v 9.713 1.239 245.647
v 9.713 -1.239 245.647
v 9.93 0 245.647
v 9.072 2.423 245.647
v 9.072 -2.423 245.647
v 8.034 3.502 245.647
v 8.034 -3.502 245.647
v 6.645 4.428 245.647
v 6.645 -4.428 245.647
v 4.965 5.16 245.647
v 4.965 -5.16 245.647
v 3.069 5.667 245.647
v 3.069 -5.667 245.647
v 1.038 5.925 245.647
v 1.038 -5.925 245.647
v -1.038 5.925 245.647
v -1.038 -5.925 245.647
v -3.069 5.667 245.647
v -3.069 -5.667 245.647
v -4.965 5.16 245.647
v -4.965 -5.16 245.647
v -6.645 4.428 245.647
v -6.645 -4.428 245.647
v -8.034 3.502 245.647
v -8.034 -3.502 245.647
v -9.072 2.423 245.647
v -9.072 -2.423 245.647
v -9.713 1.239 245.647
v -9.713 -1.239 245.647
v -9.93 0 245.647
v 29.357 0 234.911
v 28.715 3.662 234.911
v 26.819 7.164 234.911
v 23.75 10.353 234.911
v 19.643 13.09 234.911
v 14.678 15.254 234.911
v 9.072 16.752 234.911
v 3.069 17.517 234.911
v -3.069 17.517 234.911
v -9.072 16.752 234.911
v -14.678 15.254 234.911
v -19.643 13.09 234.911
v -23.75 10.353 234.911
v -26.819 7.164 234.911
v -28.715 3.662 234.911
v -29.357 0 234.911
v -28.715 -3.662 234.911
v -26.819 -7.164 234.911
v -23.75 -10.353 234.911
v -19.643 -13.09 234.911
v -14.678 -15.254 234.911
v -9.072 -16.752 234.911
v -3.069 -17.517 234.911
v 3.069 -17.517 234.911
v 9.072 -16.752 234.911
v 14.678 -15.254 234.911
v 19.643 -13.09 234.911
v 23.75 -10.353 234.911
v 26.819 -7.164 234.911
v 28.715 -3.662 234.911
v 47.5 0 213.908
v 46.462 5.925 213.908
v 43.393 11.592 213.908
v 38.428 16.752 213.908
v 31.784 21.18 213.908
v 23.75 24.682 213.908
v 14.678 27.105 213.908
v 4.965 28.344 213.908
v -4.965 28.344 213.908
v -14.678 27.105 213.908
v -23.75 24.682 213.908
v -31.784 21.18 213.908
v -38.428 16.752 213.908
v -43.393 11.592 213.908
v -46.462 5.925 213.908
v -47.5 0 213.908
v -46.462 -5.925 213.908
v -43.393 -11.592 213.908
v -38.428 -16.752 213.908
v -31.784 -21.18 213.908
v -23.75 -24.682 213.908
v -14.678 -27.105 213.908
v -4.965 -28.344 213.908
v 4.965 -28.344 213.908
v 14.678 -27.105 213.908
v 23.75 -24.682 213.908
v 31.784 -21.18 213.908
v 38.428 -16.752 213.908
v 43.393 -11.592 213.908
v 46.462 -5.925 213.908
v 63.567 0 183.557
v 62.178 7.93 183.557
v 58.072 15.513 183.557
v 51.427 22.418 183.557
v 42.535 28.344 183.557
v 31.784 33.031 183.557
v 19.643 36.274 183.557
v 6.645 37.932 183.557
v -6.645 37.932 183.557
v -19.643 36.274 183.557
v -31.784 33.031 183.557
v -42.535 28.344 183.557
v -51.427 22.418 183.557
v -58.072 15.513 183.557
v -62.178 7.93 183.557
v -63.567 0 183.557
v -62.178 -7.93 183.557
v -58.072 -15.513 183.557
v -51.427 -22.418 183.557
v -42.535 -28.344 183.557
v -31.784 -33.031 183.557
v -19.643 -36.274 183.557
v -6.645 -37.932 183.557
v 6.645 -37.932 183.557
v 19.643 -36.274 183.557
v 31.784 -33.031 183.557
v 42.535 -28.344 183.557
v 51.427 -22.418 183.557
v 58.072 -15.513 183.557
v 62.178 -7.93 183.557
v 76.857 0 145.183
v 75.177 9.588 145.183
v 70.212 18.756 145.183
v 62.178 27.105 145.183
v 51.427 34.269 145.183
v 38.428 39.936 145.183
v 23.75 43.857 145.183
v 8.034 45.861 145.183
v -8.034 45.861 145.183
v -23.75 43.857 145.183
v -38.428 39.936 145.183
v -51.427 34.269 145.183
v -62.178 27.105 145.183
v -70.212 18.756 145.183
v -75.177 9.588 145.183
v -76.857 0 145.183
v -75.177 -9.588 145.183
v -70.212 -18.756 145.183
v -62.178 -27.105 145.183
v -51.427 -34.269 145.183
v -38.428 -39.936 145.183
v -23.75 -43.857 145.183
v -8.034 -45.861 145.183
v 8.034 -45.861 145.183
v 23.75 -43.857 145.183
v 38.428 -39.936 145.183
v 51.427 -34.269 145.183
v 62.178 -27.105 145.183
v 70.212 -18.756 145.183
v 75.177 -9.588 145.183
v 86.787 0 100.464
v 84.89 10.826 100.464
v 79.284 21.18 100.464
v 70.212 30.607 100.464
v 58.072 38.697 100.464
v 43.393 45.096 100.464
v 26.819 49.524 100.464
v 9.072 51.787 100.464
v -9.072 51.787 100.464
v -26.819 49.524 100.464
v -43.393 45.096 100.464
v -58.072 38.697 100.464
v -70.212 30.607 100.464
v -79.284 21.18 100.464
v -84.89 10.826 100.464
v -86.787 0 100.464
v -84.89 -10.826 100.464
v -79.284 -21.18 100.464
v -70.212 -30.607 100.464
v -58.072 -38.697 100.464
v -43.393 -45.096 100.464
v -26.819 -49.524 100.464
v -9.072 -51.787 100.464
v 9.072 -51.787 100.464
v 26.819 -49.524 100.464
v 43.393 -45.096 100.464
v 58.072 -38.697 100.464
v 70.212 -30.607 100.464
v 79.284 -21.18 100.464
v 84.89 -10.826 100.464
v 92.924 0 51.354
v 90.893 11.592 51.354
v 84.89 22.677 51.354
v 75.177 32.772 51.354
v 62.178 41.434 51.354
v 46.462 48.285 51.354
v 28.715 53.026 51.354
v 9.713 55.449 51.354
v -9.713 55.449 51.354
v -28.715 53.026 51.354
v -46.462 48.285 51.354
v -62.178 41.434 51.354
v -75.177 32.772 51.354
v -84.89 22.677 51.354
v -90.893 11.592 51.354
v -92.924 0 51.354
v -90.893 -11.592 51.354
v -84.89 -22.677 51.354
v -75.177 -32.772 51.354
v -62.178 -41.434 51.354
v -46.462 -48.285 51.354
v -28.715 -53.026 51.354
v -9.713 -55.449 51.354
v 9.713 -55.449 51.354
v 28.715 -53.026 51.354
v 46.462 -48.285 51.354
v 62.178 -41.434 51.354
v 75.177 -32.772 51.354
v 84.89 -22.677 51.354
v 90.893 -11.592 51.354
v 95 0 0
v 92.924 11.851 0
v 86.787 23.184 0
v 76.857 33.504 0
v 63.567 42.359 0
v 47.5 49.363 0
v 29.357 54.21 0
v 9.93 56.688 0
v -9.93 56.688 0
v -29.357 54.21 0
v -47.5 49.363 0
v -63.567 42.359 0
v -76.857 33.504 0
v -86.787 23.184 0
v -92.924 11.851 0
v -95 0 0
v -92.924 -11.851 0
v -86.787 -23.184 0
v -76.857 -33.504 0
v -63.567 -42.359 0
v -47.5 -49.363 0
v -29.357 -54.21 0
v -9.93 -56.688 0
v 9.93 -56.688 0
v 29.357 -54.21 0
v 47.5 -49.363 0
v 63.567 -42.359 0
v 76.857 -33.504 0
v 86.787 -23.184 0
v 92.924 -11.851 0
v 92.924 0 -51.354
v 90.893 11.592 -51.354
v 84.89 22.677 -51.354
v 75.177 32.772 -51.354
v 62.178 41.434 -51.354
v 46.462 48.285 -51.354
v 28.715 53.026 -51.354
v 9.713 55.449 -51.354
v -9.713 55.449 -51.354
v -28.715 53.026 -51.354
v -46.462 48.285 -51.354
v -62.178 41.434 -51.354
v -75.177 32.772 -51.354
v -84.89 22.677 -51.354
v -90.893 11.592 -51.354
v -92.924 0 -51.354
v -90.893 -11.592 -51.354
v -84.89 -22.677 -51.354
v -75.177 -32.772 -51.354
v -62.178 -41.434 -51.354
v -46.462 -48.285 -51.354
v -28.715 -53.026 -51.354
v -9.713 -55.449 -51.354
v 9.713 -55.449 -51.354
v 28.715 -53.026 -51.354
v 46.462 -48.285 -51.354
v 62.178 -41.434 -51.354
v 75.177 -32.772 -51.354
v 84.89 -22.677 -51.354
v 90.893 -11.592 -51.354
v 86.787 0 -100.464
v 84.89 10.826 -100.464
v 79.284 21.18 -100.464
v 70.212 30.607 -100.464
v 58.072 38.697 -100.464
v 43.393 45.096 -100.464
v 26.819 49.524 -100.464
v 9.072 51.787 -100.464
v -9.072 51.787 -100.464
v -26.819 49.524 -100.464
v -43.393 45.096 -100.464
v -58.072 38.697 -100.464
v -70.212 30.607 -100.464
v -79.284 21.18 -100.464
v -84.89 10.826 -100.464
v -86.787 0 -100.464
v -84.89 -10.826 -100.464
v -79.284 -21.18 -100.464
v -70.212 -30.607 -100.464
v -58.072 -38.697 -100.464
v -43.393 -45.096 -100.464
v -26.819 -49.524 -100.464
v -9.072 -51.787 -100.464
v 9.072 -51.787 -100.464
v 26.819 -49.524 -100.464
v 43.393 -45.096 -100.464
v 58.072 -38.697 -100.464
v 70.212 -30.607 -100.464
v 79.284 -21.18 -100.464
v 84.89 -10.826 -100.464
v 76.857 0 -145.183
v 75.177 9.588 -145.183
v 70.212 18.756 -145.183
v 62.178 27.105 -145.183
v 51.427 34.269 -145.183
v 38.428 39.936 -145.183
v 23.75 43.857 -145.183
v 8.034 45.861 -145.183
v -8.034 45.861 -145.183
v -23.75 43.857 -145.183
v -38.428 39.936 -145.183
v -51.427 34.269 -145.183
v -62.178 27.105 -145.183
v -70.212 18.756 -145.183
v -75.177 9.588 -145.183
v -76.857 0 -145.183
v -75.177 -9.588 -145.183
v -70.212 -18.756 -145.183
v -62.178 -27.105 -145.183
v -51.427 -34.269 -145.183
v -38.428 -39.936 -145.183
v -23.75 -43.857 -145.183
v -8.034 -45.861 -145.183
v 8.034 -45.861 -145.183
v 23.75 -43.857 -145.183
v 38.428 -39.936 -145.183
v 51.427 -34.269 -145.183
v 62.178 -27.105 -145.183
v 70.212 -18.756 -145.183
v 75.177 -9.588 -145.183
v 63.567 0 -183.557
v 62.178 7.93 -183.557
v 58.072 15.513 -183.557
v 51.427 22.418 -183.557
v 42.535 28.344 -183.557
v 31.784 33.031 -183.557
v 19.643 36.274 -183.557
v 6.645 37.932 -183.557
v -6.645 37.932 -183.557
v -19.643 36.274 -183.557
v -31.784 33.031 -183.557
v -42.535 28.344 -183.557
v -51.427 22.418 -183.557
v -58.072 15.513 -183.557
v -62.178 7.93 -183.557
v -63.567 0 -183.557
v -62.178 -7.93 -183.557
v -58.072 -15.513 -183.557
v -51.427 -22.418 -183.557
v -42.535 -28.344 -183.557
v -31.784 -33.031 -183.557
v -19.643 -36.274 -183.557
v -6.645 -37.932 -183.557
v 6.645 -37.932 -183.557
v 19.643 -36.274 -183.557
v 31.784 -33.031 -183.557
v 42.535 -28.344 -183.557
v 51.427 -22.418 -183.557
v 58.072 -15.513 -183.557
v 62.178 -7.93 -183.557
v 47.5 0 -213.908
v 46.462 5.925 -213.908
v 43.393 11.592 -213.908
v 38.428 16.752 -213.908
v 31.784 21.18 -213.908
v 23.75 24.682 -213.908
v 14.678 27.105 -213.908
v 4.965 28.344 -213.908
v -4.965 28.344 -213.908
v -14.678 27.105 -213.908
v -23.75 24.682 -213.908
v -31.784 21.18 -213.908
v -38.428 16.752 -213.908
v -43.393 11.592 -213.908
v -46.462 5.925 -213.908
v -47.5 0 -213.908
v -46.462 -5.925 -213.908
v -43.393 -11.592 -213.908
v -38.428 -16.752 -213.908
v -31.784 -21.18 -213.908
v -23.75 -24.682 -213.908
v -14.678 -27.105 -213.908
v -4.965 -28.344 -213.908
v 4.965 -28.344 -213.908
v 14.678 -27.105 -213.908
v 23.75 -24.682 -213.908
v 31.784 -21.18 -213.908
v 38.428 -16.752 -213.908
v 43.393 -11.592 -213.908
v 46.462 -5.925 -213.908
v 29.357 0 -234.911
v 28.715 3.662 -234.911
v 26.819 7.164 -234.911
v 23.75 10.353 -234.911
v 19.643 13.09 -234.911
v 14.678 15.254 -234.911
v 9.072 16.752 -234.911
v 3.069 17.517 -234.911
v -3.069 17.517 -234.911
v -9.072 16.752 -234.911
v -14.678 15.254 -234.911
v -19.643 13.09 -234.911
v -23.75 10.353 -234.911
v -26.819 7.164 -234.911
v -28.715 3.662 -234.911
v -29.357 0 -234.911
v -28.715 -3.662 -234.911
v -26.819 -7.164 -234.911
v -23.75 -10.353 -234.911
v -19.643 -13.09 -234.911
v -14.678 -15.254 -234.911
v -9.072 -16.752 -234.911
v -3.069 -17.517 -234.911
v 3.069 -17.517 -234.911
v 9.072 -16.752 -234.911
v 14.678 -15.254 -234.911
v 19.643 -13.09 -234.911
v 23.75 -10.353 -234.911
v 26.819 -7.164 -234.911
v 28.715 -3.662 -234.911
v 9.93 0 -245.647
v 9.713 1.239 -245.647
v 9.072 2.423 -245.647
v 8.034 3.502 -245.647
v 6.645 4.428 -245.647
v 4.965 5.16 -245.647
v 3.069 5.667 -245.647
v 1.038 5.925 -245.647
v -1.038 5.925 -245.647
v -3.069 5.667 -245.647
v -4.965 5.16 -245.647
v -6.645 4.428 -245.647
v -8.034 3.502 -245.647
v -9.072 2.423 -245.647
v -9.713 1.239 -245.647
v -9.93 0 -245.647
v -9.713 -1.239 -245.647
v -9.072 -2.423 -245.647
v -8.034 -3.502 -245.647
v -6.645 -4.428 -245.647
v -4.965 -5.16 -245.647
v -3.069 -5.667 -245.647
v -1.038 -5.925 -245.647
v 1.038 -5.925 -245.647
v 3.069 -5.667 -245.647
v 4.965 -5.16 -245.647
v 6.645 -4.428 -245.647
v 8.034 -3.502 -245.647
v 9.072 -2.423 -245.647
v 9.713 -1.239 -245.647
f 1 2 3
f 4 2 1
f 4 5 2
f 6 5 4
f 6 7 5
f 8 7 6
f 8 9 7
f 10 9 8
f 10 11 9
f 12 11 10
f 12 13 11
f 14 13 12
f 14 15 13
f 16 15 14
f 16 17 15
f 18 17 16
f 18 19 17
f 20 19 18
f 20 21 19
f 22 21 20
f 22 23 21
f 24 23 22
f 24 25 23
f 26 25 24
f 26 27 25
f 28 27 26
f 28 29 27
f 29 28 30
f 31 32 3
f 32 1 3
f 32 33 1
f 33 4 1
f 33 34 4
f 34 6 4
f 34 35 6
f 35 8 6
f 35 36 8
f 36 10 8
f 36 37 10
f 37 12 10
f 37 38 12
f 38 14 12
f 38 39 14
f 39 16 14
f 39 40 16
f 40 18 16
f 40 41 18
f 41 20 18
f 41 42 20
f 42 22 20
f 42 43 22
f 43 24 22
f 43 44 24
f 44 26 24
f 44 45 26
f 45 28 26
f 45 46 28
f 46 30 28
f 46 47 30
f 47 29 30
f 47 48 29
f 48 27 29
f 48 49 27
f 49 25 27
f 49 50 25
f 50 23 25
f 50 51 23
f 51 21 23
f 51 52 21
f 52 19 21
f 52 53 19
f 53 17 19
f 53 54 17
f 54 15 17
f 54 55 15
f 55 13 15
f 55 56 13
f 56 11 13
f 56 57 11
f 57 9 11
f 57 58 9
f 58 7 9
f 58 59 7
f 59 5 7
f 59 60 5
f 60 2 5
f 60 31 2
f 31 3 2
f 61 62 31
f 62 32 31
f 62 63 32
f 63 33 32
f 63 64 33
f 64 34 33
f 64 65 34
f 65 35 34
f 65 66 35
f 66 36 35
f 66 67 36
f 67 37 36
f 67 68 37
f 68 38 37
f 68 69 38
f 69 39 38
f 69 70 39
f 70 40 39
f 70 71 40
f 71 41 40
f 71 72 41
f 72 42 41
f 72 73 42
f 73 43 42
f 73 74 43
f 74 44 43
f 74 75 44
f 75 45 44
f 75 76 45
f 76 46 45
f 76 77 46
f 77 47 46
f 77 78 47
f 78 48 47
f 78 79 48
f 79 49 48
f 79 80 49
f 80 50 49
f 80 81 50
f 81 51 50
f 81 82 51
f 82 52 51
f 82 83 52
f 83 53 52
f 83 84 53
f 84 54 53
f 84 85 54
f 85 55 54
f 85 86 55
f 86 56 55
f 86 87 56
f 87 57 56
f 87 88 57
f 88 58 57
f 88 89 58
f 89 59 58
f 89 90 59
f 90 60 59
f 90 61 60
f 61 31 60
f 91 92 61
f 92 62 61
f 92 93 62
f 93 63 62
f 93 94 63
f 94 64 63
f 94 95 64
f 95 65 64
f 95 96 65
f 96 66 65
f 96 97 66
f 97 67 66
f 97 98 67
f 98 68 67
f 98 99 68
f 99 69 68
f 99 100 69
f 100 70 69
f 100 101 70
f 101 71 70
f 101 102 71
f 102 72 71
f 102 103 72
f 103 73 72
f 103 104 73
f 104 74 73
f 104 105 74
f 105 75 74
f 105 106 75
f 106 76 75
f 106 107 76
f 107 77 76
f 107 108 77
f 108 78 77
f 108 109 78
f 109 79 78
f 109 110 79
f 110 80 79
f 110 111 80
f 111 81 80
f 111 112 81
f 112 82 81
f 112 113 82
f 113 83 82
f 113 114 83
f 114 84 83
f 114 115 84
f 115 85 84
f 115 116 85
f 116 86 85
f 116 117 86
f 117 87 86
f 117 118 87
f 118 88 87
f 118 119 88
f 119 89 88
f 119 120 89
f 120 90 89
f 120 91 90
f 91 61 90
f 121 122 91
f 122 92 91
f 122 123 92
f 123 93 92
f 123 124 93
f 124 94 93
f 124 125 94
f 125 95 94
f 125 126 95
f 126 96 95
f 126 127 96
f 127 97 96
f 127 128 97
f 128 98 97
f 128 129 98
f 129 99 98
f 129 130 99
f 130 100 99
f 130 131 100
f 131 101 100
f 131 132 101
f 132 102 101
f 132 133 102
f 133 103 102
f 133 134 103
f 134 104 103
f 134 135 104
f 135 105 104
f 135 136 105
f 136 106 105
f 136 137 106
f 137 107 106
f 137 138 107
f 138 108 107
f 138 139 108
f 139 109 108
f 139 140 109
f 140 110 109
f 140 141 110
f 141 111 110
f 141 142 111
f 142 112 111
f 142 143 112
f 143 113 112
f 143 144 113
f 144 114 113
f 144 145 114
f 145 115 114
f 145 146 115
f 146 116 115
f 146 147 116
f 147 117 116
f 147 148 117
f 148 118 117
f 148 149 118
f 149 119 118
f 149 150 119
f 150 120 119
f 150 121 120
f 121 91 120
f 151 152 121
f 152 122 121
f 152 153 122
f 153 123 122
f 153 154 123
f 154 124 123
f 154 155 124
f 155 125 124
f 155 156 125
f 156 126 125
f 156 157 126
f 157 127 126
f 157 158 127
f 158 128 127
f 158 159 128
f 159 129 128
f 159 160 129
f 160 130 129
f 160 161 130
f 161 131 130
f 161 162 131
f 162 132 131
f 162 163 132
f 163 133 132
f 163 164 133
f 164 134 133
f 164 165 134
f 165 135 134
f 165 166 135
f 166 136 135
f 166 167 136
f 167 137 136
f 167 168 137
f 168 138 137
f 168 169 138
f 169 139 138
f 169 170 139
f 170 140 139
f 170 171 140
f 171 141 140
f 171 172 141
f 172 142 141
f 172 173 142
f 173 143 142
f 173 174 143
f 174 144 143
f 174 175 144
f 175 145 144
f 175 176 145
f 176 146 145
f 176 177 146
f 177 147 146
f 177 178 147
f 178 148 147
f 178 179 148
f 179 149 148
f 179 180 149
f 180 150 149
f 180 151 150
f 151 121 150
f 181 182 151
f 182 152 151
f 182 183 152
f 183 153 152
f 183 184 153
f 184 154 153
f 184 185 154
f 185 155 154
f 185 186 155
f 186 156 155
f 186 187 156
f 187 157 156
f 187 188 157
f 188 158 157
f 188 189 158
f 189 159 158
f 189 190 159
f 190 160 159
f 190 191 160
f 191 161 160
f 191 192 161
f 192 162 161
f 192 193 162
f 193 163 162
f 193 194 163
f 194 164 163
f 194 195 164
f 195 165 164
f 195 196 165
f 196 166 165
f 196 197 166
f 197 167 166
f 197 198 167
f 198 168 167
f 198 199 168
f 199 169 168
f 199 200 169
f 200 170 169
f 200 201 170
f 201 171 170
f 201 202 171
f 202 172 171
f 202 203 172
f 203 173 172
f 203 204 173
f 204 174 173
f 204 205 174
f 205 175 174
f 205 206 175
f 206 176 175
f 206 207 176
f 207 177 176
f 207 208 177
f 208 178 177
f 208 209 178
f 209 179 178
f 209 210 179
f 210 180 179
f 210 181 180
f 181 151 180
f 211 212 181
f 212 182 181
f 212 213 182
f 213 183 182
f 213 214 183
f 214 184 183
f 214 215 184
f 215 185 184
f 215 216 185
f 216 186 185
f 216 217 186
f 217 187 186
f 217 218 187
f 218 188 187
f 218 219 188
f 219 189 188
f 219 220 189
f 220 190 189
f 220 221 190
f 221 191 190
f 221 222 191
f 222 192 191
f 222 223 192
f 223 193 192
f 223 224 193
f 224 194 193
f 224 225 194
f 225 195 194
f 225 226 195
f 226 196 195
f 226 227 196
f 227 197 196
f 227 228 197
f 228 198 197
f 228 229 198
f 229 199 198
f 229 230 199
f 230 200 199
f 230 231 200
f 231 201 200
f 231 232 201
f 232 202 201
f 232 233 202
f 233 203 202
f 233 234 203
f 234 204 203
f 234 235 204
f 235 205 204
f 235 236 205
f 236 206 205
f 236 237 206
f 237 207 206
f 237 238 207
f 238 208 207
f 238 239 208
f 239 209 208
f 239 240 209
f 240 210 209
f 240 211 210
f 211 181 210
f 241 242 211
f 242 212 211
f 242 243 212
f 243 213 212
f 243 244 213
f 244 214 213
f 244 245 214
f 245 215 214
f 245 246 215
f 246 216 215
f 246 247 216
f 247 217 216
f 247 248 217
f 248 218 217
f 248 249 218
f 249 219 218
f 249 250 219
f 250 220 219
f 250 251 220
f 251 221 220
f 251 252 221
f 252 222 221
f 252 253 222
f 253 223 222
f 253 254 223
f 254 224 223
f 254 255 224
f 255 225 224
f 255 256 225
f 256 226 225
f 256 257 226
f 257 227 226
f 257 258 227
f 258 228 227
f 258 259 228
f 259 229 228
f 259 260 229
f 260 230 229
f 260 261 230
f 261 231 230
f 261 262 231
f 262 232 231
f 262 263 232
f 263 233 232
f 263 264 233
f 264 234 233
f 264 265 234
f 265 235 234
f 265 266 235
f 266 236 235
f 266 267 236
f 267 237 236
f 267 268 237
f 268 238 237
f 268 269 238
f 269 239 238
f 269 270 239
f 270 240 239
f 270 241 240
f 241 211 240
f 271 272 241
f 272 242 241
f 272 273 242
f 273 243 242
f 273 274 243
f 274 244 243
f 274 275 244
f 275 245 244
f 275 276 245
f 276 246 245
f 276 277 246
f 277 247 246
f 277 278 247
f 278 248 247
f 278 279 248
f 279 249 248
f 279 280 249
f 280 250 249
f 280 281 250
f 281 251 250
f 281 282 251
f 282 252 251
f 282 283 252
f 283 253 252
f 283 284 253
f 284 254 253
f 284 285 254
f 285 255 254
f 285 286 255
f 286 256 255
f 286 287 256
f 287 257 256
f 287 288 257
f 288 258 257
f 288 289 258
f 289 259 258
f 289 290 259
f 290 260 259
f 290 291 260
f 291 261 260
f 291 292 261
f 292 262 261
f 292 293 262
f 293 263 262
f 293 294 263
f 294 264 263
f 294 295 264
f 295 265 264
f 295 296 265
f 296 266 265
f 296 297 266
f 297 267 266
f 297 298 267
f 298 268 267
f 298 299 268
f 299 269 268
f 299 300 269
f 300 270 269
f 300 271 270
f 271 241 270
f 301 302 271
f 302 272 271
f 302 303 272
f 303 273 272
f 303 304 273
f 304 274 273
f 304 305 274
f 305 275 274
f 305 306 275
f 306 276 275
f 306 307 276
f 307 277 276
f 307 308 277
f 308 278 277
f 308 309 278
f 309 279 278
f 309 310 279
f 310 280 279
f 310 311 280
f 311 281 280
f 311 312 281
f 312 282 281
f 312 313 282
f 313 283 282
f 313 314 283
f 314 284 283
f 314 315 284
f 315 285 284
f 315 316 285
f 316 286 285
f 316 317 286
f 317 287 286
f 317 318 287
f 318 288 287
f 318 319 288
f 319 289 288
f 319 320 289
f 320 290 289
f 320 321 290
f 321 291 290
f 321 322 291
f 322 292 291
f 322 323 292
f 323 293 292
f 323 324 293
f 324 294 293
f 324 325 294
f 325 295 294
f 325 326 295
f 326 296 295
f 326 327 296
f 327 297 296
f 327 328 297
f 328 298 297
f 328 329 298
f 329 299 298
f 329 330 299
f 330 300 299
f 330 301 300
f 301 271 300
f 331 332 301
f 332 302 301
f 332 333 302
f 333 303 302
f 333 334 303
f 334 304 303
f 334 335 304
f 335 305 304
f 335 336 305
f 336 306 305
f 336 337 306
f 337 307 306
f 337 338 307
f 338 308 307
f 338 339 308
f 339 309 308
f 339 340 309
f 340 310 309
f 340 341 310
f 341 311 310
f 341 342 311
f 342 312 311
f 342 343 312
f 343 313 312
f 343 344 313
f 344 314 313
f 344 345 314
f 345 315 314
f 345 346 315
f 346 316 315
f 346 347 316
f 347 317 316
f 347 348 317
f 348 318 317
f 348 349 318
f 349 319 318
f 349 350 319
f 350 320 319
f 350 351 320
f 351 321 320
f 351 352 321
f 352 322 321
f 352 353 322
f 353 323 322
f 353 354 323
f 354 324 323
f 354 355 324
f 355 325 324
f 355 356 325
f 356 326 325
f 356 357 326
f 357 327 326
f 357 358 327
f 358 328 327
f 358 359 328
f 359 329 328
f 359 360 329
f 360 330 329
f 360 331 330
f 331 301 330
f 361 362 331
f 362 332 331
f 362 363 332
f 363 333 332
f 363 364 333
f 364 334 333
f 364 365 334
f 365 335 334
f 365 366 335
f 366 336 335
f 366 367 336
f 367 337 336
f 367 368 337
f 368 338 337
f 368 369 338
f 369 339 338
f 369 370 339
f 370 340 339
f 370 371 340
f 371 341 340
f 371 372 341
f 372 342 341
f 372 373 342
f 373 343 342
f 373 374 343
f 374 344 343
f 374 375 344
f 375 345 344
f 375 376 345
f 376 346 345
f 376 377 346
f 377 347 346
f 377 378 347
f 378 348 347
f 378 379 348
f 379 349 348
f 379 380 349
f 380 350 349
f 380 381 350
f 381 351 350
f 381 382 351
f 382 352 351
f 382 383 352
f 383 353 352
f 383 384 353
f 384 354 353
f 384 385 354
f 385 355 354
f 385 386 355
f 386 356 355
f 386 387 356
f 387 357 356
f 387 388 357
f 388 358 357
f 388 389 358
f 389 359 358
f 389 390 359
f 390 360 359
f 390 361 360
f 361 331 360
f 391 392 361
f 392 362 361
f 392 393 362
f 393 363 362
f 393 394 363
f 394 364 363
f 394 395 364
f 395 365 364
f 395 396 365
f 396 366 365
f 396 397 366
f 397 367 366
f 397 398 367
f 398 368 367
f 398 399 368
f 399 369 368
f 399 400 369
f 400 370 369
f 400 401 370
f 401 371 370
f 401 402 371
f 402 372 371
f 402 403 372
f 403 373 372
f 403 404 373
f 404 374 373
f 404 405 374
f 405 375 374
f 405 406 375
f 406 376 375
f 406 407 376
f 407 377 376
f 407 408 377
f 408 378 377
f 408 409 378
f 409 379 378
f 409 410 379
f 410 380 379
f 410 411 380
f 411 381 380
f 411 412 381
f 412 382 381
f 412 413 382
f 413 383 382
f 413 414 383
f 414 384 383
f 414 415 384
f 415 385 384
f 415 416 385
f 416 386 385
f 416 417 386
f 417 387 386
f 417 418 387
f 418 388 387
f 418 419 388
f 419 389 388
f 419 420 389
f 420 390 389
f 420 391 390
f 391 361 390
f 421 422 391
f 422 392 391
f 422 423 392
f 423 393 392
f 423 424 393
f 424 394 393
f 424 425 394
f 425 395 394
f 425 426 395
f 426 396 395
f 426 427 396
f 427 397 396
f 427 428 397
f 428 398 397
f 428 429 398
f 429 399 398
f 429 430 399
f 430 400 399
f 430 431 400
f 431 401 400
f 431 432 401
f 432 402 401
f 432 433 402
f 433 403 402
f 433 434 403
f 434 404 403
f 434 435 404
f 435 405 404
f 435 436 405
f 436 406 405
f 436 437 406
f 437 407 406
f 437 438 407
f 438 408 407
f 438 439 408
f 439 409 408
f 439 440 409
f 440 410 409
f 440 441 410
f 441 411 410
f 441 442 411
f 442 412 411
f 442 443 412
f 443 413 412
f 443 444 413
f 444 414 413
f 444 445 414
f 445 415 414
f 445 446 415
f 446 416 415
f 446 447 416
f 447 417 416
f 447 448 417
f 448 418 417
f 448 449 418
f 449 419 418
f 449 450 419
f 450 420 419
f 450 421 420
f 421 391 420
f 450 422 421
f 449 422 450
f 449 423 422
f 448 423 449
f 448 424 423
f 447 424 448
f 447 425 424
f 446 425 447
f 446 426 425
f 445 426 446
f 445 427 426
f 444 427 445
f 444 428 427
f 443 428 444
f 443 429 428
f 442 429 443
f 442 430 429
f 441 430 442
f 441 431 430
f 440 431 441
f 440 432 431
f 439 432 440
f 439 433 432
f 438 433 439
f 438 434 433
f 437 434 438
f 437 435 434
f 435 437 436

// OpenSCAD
// Generated by SolidPython 1.0.1 on 2020-07-29 00:46:46


scale(v = [5, 3, 13]) {
	sphere(r = 19);
}
/***********************************************
*********      SolidPython code:      **********
************************************************
 
# import packages: SolidPython
from solid import *
from solid.utils import *
from itertools import chain, combinations, permutations


class Resize:

    def __init__(self, scad_file):
        self.scad_file = scad_file
        #self.scad_file = import_scad(scad_file)
        # cone/cylinder param:
        self.r1 = 0
        self.r2 = 0
        self.h = 0
        # rectangular prism param:
        self.w = 0
        self.l = 0
        # ellipse param:
        self.r = 0

    # import OpenScad code (file name corresponds to shape)


    # classify shape + parameters
    def assign(self, param1, param2, param3):
        if self.scad_file == 'cone.scad':
            self.r1 = param1
            self.r2 = param2
            self.h = param3
        elif self.scad_file == 'cylinder.scad':
            self.r1 = param1
            self.r2 = param2
            self.h = param3
        elif self.scad_file == 'rectangularPrism.scad':
            self.h = param1
            self.l = param2
            self.w = param3
        else:
            self.r = param1
            self.h = param2

    # resize parameters
    def iterate(self):
        x = range(3, 20, 2)
        i = 1
        if self.scad_file == 'cone.scad':
            tempList = list(permutations(x, 2))
            for temp in tempList:
                param1 = temp[0]
                param2 = temp[1]
                filepath = 'produced_scad_files/' + 'cone' + str(param1) + '_' + str(param2) + '_' + '.scad'
                scad_render_to_file(cylinder(h=param1, r1=param2, r2=0), filepath)

        elif self.scad_file == 'cylinder.scad':
            tempList = list(permutations(x, 3))
            for temp in tempList:
                param1 = temp[0]
                param2 = temp[1]
                filepath = 'produced_scad_files/' + 'cylinder' + str(param1) + '_' + str(param2) + '_' + '.scad'
                scad_render_to_file(cylinder(h=param1, r1=param2, r2=param2), filepath)

        elif self.scad_file == 'rectangularPrism.scad':
            tempList = list(permutations(x, 3))
            for temp in tempList:
                param1 = temp[0]
                param2 = temp[1]
                param3 = temp[2]
                filepath = 'produced_scad_files/' + 'rectangularPrism' + str(param1) + '_' + str(param2) + '_' + str(
                    param3) + '.scad'
                scad_render_to_file(cube(size=(param1, param2, param3)), filepath)

        elif self.scad_file == 'ellipse.scad':
            tempList = list(permutations(x, 4))
            for temp in tempList:
                param1 = temp[0]
                param2 = temp[1]
                param3 = temp[2]
                param4 = temp[3]
                filepath = 'produced_scad_files/' + 'ellipse' + str(param1) + '_' + str(param2) + '_' + str(param3) + '_' + str(param4) + '.scad'
                scad_render_to_file(scale([param1, param2, param3])(sphere(r=param4)), filepath)

    def render_to_scadfile(self):
        scad_render_to_file(scad, 'example.scad') 
 
************************************************/
